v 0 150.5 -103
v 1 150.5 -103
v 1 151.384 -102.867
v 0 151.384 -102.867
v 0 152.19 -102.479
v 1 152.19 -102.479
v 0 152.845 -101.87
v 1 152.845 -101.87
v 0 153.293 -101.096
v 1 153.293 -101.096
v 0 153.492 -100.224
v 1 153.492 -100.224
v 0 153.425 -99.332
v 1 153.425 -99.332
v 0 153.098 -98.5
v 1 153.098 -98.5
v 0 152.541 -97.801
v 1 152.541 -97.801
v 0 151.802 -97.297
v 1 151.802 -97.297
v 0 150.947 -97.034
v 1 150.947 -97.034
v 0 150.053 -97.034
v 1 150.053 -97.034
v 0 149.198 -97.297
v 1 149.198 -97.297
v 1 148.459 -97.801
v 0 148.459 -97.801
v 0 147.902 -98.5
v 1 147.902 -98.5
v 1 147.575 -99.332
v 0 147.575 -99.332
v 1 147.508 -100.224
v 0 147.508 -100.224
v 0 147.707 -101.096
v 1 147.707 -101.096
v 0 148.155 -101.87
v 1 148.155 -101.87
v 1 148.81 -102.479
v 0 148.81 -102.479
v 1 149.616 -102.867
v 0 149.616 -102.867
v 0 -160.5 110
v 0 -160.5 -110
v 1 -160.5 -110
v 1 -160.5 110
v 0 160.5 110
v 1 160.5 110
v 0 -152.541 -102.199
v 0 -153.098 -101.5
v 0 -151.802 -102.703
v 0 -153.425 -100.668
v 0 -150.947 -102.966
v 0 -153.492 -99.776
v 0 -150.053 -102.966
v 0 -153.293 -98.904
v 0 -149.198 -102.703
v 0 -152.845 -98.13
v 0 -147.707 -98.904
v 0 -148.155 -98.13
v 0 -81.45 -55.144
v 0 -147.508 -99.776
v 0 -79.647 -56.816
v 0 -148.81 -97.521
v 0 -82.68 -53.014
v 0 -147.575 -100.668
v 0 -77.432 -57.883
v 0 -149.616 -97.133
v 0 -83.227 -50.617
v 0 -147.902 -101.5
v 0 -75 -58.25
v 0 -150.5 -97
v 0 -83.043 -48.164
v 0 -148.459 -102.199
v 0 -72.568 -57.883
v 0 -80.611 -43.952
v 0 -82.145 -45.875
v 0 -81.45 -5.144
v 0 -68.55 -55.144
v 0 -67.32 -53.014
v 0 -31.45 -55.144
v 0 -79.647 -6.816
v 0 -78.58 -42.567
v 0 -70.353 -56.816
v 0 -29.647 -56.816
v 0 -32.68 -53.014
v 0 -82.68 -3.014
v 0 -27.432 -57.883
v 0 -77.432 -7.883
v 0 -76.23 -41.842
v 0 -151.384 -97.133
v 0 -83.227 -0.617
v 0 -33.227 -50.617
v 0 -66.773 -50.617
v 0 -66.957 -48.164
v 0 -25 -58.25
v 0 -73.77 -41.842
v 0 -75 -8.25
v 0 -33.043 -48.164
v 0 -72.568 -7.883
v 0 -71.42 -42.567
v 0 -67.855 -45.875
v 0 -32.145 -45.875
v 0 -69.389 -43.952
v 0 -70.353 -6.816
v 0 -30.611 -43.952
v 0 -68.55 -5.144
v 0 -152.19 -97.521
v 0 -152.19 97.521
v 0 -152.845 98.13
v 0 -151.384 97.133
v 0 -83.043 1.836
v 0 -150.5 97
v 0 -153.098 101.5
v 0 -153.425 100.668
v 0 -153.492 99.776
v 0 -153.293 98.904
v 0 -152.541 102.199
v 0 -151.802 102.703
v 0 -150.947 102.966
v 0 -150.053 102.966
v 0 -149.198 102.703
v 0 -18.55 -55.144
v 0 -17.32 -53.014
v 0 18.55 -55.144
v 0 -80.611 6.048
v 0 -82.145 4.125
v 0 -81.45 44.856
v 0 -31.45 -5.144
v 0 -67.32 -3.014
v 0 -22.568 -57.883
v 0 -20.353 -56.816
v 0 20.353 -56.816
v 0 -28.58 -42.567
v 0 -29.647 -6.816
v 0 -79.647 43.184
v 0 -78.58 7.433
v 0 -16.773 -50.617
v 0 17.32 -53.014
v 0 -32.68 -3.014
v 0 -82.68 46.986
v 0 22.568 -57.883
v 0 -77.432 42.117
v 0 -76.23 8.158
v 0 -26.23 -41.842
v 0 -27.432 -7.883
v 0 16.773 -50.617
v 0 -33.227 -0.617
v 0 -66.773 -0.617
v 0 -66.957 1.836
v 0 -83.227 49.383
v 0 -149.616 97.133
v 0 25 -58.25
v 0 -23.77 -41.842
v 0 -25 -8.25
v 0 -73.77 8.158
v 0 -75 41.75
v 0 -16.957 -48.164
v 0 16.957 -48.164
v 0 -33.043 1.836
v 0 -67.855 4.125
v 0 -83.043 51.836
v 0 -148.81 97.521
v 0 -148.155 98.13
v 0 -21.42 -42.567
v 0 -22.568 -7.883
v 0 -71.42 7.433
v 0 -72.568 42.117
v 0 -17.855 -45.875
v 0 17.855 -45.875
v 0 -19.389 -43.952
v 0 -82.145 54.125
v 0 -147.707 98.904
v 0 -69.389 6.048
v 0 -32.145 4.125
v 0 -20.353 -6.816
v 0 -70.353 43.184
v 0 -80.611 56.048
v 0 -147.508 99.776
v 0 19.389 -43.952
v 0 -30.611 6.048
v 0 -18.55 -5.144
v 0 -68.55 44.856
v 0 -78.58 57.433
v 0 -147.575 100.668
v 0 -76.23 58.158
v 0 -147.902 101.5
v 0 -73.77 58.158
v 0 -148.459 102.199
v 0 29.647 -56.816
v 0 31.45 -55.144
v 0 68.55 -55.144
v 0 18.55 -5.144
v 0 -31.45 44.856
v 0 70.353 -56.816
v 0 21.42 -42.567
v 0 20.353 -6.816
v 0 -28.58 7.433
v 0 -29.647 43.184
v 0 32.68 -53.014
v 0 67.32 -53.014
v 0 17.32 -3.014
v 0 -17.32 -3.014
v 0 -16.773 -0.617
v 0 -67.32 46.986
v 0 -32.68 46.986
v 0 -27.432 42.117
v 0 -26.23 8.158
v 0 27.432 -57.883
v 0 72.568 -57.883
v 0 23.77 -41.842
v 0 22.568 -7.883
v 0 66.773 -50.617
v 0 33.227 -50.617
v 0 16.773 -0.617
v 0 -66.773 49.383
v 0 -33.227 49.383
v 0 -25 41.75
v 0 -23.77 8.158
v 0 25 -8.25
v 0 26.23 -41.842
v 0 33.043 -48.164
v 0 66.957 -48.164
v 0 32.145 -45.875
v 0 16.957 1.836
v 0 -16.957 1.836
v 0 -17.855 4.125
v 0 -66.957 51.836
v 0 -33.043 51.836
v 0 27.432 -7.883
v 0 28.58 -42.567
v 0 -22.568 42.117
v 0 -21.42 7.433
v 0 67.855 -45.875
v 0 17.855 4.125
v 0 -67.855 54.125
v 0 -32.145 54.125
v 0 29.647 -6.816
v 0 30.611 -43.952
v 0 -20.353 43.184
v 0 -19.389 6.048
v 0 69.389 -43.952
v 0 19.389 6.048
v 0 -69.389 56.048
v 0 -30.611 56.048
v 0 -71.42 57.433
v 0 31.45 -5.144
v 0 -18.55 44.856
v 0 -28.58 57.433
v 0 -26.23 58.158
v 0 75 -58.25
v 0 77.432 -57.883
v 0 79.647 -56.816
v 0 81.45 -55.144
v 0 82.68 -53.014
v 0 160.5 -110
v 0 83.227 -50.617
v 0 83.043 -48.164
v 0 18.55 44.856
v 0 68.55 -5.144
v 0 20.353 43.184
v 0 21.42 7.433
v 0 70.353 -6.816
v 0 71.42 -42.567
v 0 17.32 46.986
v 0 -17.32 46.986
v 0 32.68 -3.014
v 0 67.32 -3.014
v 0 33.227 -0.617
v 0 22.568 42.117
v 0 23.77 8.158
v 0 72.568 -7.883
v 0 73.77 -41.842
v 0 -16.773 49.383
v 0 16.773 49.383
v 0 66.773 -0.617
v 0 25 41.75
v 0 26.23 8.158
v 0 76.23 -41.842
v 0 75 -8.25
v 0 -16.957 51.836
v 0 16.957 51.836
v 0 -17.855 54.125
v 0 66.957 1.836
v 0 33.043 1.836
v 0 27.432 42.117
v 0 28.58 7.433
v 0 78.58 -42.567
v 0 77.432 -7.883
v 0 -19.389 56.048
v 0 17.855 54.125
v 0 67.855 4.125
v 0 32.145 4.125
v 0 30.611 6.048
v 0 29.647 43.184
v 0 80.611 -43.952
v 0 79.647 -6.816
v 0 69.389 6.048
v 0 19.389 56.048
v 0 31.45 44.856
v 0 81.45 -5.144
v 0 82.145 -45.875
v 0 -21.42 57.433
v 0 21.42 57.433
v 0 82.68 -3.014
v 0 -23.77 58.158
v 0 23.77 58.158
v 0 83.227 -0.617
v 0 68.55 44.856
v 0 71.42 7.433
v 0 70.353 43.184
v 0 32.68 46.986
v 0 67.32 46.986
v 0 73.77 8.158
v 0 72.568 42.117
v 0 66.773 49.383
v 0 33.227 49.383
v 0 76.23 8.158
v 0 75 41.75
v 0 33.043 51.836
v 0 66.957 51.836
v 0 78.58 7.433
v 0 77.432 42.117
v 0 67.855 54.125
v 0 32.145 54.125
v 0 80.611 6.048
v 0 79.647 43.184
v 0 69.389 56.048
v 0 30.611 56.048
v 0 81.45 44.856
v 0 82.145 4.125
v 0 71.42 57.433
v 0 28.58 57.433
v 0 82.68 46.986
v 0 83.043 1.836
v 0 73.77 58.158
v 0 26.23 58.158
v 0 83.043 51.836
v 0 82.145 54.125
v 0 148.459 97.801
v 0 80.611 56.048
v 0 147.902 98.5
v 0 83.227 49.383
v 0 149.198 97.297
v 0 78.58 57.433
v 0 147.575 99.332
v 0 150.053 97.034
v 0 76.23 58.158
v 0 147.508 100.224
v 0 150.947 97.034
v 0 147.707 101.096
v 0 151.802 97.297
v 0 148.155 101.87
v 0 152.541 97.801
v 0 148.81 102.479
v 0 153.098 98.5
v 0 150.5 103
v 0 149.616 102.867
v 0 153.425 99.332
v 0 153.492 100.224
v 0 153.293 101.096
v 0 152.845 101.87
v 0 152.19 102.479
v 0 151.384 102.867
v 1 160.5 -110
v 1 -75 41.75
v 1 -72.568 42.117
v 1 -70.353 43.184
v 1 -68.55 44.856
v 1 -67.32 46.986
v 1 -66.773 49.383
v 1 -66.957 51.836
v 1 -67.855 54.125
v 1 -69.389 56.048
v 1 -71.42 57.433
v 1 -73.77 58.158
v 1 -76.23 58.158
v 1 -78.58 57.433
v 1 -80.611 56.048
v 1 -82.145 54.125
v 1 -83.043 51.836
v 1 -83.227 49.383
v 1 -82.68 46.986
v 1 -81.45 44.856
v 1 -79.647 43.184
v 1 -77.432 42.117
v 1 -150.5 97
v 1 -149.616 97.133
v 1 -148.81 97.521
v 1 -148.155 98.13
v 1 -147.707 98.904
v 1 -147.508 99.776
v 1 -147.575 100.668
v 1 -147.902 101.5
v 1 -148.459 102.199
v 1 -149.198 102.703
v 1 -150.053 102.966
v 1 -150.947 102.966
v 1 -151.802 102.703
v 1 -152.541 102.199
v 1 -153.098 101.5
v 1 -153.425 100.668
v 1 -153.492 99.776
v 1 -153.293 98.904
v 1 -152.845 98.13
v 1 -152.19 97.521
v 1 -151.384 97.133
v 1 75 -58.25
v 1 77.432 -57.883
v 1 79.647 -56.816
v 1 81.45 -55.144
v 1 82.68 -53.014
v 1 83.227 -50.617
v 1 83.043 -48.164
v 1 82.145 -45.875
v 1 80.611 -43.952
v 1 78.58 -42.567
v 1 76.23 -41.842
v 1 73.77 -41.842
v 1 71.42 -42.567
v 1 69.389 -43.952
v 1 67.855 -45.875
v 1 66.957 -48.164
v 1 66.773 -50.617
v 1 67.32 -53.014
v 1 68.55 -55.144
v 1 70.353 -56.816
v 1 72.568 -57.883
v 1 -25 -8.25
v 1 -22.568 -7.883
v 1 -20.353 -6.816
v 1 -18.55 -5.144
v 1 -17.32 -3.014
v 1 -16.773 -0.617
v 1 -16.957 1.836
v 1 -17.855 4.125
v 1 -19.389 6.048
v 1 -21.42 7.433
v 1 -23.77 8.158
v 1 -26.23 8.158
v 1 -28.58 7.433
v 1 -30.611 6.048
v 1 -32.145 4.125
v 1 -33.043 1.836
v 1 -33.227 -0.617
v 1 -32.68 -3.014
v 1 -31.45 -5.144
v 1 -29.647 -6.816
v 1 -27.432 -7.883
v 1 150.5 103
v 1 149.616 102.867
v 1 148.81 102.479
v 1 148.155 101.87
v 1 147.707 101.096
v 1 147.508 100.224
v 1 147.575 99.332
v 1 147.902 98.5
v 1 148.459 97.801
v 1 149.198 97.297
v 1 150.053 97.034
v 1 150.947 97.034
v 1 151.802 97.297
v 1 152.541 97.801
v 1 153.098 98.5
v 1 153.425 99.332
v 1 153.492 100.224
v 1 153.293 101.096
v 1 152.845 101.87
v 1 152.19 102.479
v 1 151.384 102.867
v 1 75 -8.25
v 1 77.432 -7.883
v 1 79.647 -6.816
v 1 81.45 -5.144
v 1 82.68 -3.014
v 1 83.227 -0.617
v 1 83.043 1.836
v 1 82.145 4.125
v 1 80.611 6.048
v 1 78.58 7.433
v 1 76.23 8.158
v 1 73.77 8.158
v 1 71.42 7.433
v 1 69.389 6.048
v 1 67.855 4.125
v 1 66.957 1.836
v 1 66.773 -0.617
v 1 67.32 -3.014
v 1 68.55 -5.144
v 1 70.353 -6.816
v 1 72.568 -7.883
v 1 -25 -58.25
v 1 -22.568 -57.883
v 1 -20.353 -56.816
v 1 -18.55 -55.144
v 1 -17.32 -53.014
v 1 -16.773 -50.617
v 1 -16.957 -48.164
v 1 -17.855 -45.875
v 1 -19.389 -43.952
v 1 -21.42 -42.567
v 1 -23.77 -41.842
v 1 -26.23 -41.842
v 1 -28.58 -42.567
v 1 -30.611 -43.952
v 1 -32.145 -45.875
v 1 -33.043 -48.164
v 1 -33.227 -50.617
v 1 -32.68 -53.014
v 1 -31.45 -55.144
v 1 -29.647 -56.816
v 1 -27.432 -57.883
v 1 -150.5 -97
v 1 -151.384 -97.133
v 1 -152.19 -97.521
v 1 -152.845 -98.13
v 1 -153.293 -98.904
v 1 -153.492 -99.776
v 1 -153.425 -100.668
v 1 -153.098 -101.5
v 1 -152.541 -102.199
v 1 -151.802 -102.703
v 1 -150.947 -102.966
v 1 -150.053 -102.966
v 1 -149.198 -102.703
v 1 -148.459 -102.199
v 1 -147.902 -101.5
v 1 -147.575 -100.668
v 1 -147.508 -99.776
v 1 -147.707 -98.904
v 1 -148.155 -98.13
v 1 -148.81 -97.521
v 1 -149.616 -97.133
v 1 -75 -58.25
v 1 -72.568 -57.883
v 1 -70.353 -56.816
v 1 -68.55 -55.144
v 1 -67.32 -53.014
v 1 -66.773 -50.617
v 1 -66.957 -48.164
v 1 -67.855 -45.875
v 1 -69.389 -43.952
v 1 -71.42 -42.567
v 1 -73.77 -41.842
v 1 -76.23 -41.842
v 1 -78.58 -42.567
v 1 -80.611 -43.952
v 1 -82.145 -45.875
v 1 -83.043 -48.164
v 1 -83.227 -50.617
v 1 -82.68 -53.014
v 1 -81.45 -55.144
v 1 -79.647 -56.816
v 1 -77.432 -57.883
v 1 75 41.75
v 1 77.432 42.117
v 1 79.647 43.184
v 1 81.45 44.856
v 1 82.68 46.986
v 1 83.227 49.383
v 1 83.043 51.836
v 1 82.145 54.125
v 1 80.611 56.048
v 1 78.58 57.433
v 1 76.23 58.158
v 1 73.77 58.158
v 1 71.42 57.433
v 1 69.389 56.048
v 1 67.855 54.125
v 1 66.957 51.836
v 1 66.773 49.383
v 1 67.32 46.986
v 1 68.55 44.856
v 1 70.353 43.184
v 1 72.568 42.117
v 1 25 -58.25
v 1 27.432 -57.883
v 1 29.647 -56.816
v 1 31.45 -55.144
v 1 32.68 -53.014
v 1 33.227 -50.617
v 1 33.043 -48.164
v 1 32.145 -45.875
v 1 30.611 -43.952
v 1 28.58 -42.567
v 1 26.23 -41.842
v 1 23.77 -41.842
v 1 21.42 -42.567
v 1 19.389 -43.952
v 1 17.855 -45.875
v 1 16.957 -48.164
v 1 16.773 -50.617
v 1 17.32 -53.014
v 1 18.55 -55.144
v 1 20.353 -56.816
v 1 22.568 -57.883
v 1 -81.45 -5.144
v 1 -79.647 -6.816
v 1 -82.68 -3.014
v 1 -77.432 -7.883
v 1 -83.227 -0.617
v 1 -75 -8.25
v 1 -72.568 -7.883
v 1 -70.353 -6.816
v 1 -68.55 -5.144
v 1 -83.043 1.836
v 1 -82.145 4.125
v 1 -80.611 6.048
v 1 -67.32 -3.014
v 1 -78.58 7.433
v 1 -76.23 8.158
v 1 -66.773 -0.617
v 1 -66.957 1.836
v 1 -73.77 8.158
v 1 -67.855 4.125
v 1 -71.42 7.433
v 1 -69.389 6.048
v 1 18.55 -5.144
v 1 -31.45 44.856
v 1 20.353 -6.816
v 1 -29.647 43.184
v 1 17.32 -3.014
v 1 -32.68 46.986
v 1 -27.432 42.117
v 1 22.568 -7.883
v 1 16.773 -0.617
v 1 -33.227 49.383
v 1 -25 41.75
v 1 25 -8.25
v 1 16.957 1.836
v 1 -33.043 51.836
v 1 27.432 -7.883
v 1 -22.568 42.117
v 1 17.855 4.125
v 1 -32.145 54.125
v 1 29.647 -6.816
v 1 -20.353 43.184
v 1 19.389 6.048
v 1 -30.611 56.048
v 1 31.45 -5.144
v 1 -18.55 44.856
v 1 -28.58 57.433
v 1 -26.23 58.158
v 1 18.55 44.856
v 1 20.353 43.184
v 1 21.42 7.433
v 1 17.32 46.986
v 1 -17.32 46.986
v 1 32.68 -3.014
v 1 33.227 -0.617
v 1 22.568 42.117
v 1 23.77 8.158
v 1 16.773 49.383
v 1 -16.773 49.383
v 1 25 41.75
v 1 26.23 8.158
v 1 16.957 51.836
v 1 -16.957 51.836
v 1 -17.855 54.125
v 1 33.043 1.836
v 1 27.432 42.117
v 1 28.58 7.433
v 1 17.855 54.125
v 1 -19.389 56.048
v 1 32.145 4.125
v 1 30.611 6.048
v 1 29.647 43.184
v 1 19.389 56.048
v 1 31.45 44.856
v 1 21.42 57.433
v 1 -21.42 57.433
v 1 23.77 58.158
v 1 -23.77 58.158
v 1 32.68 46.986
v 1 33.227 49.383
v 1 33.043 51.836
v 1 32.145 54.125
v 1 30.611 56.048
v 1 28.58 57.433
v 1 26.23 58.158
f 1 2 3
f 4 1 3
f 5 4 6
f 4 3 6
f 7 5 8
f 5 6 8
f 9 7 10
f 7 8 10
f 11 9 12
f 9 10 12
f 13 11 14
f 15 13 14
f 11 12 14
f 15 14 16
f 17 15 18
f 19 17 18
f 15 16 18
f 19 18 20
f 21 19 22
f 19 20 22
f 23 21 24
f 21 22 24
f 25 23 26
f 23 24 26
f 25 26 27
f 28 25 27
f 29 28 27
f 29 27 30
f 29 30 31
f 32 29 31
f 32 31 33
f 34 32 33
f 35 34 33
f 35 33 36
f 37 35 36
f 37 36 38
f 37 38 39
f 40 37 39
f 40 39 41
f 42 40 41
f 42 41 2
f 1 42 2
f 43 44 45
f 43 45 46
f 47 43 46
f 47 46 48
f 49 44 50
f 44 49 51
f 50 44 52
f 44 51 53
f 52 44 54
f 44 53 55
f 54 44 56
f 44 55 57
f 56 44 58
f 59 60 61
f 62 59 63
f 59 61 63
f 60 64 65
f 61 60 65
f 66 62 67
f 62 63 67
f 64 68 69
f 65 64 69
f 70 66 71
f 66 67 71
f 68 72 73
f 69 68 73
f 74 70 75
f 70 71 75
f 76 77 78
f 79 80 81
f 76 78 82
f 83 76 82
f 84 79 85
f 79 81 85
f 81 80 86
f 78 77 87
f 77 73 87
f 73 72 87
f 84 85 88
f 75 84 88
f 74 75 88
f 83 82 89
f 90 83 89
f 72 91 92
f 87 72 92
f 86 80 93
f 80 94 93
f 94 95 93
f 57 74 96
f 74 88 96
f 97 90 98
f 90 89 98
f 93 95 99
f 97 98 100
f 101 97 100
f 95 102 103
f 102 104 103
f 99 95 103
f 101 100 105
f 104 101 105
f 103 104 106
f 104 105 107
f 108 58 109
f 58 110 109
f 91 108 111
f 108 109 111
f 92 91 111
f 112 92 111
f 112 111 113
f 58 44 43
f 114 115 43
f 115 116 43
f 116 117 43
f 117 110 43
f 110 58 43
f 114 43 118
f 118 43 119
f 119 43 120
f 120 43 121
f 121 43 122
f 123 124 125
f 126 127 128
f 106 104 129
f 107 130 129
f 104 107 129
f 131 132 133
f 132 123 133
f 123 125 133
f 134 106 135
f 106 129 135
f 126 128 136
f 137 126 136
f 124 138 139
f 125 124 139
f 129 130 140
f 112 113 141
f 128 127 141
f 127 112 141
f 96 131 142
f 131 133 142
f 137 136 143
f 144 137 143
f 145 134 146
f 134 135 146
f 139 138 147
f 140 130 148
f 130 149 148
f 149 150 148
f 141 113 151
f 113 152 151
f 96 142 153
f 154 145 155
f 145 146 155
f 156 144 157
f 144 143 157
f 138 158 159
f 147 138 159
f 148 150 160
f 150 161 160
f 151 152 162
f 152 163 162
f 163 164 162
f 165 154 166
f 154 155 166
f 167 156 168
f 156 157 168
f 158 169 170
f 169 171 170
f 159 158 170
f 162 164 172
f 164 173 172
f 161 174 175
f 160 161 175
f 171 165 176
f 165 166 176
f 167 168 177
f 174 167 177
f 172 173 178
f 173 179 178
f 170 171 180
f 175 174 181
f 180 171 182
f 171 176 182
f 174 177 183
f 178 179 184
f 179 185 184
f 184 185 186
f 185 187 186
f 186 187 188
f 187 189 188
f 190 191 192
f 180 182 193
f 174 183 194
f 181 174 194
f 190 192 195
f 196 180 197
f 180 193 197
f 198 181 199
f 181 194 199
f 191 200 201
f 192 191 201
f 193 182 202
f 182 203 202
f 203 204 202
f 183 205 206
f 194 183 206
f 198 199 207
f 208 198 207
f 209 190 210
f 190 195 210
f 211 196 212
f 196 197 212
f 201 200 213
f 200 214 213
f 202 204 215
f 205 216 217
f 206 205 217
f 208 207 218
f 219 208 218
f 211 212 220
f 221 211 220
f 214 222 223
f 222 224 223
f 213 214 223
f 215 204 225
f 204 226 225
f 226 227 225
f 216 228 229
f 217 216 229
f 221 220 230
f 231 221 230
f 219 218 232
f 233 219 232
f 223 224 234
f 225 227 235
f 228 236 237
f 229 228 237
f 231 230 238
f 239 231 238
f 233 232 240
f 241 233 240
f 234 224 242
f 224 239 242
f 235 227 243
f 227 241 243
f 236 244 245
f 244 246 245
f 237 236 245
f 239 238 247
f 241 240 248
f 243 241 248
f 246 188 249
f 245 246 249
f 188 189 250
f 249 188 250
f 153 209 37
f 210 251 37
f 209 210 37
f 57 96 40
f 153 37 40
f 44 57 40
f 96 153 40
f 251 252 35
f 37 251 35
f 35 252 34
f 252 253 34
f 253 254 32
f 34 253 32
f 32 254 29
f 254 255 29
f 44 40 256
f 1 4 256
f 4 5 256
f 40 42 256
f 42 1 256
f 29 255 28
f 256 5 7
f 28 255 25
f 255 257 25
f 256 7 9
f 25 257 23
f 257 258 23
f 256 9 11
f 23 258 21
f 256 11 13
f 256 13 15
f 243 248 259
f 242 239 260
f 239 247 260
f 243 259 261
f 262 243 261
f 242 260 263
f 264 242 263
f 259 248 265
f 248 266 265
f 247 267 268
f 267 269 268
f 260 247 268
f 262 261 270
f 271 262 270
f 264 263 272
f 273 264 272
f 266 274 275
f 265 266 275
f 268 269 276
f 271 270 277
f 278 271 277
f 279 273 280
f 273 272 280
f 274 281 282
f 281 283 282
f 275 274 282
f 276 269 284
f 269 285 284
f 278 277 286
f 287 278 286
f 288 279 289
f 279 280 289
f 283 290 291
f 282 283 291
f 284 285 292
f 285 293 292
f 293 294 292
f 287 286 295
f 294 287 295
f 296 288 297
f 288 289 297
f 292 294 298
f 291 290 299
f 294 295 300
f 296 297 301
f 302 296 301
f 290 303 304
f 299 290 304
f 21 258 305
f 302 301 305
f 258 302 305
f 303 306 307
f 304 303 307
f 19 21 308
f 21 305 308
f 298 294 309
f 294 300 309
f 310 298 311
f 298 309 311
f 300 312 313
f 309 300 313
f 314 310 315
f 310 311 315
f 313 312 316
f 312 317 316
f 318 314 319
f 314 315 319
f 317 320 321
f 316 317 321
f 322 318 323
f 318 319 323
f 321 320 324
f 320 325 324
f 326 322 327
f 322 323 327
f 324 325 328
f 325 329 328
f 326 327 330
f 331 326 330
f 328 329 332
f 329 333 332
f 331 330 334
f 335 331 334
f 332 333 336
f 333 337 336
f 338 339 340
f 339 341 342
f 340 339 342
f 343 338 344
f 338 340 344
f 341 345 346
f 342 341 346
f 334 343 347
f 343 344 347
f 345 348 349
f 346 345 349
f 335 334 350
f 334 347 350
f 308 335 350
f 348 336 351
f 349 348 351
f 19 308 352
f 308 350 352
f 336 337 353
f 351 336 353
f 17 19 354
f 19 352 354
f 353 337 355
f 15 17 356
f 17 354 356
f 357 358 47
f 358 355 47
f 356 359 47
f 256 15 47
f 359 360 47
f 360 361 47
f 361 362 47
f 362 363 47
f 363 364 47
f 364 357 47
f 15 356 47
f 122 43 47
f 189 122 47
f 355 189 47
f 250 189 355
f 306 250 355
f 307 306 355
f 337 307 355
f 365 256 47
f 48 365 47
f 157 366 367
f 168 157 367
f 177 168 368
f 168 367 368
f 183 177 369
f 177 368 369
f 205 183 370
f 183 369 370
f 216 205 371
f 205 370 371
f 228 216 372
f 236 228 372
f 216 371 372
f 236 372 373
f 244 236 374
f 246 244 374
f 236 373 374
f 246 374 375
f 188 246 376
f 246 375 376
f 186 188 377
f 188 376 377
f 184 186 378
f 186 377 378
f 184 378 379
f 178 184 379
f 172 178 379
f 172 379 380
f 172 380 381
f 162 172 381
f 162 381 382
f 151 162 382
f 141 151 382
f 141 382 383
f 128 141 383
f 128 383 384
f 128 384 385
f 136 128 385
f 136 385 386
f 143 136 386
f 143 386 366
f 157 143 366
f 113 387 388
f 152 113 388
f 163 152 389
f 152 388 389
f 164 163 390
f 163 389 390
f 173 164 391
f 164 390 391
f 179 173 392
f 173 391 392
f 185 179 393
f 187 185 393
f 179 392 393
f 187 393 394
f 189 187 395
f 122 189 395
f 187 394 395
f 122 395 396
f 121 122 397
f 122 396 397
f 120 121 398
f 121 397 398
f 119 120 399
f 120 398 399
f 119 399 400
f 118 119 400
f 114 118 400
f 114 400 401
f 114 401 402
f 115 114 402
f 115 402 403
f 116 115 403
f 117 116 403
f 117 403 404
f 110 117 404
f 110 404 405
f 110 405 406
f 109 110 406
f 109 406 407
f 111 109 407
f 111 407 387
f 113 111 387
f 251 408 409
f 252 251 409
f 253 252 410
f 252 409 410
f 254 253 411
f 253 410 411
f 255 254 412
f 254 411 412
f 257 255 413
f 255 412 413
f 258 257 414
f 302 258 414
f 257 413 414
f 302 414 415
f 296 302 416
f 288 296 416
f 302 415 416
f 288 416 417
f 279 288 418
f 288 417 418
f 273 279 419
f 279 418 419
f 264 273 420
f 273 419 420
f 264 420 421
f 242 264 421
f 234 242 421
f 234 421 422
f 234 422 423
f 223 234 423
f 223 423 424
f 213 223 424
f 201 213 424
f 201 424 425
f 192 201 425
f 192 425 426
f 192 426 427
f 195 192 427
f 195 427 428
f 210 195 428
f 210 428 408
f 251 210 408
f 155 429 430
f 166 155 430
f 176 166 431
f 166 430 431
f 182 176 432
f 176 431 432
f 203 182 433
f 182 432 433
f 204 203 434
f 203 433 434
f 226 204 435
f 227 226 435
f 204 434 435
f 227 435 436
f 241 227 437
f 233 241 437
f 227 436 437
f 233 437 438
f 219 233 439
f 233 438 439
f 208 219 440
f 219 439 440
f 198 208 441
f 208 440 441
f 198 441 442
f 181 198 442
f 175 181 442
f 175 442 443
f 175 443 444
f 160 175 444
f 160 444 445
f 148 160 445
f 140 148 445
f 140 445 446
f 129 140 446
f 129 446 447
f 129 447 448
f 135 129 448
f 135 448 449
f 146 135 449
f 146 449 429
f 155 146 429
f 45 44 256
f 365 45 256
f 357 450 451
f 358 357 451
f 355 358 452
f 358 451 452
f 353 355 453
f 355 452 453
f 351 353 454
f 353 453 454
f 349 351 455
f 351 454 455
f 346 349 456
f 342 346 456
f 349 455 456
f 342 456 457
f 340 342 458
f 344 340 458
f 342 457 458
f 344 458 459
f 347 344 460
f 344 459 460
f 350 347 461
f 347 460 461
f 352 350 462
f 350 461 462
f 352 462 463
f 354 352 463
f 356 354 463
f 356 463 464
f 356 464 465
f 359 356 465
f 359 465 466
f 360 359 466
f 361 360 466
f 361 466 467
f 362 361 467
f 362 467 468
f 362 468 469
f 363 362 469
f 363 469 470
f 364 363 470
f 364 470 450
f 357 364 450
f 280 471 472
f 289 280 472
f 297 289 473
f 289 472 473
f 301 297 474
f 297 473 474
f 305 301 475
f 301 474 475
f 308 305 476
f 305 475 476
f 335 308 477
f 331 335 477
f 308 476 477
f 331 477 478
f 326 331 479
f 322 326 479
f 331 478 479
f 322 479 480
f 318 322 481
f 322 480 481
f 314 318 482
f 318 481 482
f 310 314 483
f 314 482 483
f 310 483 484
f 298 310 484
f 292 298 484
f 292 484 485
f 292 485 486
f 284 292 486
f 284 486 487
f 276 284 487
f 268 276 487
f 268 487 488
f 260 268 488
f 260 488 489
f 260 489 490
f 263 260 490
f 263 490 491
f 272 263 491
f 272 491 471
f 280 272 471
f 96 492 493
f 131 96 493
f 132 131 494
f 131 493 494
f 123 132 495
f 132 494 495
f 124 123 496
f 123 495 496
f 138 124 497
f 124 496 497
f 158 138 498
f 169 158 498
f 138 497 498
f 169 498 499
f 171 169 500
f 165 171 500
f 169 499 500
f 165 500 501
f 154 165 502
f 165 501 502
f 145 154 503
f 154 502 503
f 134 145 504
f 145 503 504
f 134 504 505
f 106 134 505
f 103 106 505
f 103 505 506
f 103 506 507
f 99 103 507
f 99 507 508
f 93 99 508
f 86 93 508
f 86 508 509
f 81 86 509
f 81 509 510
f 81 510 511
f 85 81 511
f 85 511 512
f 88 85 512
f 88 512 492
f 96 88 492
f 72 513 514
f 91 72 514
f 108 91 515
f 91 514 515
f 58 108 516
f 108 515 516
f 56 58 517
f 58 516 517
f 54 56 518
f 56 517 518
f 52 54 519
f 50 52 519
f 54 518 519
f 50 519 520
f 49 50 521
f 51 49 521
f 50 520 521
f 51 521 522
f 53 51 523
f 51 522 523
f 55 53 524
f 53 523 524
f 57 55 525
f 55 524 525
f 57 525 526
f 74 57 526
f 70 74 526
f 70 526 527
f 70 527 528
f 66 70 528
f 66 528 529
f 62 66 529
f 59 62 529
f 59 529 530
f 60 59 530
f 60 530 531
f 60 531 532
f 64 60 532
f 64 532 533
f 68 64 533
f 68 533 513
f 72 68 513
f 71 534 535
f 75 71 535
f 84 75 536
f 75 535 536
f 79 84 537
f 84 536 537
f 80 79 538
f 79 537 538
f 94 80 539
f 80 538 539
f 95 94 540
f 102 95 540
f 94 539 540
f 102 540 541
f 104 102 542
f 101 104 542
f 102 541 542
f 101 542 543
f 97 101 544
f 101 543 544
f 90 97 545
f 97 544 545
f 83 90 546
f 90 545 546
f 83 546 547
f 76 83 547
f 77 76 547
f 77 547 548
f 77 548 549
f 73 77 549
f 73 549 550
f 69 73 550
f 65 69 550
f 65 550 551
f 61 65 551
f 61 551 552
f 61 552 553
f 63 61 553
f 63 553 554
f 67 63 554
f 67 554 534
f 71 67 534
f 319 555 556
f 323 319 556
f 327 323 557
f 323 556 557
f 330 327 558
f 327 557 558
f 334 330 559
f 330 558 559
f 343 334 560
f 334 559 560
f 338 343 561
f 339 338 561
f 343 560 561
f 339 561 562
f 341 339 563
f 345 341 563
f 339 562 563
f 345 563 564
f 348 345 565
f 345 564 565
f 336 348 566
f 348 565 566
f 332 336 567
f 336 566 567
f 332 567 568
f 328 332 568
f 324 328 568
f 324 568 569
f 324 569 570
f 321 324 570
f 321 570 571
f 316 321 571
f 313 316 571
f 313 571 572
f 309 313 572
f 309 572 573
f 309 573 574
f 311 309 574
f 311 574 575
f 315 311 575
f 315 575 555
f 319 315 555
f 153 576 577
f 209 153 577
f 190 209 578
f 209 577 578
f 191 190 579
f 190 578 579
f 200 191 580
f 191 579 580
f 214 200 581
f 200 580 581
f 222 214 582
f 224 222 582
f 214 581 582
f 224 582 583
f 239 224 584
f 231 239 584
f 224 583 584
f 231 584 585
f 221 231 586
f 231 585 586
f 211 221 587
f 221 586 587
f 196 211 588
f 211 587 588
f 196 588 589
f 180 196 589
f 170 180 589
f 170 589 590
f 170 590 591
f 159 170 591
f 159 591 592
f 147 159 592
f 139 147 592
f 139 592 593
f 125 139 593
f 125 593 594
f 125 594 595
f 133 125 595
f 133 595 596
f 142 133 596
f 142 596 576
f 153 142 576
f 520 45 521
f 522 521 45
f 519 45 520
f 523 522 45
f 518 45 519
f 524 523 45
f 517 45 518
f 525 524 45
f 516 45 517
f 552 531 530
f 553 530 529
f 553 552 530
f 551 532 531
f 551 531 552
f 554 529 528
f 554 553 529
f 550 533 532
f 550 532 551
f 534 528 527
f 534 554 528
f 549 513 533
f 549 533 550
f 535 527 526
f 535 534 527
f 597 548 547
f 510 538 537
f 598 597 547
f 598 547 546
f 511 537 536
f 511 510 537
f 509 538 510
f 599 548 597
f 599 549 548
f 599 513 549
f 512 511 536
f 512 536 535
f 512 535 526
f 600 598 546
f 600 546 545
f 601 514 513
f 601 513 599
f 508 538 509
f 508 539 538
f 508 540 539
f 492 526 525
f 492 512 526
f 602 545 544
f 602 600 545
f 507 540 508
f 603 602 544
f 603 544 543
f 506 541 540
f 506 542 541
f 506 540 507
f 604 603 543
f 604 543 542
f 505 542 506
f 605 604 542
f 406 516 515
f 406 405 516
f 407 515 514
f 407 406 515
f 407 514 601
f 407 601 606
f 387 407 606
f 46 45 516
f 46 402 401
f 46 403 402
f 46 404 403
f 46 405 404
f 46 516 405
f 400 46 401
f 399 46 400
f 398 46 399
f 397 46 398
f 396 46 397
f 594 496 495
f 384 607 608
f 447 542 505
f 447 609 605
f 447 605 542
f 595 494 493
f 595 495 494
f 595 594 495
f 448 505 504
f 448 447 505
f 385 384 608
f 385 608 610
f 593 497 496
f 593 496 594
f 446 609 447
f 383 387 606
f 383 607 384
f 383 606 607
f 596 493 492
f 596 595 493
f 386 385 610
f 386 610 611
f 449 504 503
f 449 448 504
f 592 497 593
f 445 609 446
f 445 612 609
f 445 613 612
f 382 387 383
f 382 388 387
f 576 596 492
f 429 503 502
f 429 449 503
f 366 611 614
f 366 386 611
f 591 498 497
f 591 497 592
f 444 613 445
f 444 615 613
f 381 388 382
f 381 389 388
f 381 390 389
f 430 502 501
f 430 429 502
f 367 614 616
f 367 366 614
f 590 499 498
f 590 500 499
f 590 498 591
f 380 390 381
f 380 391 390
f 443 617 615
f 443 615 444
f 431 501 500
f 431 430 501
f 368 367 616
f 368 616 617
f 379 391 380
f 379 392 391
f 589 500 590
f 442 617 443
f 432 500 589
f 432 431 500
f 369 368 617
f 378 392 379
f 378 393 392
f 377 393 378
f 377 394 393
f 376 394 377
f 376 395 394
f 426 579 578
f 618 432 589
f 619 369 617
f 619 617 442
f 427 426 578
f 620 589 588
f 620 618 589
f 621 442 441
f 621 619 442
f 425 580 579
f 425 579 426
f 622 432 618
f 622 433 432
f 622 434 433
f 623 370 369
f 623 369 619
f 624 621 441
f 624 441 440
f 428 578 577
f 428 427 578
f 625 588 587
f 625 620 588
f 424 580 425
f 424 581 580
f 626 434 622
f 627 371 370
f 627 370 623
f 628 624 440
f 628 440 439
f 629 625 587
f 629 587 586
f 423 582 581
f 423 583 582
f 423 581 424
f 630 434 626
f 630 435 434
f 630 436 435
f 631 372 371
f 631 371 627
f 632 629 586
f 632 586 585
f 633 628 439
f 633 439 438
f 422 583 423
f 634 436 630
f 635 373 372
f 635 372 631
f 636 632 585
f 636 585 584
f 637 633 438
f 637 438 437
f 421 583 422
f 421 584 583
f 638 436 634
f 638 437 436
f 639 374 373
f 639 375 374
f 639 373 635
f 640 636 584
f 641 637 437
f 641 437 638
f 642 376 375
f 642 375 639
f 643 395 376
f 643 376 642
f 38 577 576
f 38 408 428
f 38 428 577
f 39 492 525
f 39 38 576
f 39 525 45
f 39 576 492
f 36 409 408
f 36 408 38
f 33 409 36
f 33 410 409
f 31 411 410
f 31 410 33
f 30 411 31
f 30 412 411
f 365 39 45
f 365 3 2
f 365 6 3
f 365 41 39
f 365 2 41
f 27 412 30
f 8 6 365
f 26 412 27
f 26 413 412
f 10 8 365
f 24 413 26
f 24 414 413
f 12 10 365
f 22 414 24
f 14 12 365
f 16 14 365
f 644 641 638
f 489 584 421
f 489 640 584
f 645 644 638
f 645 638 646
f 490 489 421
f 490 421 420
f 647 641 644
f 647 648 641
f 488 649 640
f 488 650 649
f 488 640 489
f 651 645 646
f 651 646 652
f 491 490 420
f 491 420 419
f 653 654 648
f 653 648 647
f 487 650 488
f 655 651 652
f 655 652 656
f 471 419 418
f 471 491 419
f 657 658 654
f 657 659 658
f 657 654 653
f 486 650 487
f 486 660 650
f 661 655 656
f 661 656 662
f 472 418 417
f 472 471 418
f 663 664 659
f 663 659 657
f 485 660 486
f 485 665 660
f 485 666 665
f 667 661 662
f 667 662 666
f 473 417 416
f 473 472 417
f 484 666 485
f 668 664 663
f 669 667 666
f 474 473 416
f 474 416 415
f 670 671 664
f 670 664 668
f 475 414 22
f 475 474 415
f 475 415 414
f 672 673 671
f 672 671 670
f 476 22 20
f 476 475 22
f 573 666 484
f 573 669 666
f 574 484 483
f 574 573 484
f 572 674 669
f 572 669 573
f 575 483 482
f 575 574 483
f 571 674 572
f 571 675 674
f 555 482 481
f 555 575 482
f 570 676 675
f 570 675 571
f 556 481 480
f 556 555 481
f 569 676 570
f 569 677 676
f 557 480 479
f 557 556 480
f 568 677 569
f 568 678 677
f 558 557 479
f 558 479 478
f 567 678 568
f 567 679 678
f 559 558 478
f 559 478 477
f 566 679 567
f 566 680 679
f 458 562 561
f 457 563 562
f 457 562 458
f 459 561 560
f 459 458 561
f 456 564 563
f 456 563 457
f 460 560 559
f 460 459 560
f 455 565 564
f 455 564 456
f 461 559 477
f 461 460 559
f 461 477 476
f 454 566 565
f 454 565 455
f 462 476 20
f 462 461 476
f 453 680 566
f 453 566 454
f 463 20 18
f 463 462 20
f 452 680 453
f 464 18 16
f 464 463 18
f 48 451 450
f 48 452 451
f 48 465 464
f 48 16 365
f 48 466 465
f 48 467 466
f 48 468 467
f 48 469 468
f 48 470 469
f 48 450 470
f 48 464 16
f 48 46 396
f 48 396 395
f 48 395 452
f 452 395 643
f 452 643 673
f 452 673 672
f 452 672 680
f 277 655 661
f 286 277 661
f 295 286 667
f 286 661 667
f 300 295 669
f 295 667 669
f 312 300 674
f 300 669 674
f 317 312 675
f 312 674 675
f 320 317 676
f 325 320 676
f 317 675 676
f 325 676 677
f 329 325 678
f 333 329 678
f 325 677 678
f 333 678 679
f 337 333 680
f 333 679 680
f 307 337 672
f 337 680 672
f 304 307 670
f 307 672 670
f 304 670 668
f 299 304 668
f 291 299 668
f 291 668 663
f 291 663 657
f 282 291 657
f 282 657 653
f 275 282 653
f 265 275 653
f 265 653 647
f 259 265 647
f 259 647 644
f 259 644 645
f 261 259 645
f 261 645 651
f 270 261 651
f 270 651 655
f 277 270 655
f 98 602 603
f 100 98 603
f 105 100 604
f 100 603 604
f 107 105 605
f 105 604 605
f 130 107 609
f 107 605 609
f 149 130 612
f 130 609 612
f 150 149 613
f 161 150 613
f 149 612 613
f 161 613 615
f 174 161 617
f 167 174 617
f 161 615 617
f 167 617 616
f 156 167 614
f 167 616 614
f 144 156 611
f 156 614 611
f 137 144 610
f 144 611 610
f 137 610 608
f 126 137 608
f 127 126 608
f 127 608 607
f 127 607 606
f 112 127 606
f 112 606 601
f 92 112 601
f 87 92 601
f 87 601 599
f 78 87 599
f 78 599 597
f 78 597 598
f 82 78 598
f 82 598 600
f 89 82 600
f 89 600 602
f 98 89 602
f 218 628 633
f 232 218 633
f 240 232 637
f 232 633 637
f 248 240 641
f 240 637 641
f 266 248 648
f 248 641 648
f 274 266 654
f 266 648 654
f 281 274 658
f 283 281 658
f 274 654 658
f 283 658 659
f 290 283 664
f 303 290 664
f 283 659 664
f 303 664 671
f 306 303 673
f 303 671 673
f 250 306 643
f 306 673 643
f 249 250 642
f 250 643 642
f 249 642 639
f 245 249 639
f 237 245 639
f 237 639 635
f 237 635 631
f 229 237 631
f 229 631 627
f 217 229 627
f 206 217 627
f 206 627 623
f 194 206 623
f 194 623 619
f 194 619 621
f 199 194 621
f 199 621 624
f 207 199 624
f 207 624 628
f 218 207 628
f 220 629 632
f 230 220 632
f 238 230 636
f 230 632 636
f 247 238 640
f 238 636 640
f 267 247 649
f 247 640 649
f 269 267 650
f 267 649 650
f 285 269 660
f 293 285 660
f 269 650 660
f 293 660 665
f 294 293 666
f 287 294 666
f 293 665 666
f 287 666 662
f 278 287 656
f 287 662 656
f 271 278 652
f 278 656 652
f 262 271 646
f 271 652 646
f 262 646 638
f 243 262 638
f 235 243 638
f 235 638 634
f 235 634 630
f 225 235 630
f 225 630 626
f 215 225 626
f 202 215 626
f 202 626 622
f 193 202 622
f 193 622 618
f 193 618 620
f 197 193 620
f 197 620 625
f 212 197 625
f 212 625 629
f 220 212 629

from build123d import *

# Parameters (mm, degrees)
SKETCH1_W           = 321
SKETCH1_H           = 220
BOSS_EXTRUDE1_DEPTH = 1
SKETCH2_R           = 8.25
CUT_EXTRUDE1_DEPTH  = 195.579675198
SKETCH3_R           = 3
CUT_EXTRUDE2_DEPTH  = 195.579675198


with BuildPart() as part:
    # Sketch1 → Boss-Extrude1 (new body)
    with BuildSketch(Plane.YZ):
        Rectangle(SKETCH1_W, SKETCH1_H)
    extrude(amount=BOSS_EXTRUDE1_DEPTH)

    # Sketch2 → Cut-Extrude1 (cut, through all)
    with BuildSketch(Plane.YZ.offset(1)):
        with Locations(Location((-75, 50, 0), (0, 0, 270))):
            Circle(SKETCH2_R)
        with Locations(Location((-25, 50, 0), (0, 0, 270))):
            Circle(SKETCH2_R)
        with Locations(Location((25, 50, 0), (0, 0, 270))):
            Circle(SKETCH2_R)
        with Locations(Location((75, 50, 0), (0, 0, 270))):
            Circle(SKETCH2_R)
        with Locations(Location((-25, 0, 0), (0, 0, 270))):
            Circle(SKETCH2_R)
        with Locations(Location((25, 0, 0), (0, 0, 270))):
            Circle(SKETCH2_R)
        with Locations(Location((75, 0, 0), (0, 0, 270))):
            Circle(SKETCH2_R)
        with Locations(Location((-25, -50, 0), (0, 0, 270))):
            Circle(SKETCH2_R)
        with Locations(Location((25, -50, 0), (0, 0, 270))):
            Circle(SKETCH2_R)
        with Locations(Location((75, -50, 0), (0, 0, 270))):
            Circle(SKETCH2_R)
        with Locations(Location((-75, 0, 0), (0, 0, 270))):
            Circle(SKETCH2_R)
        with Locations(Location((-75, -50, 0), (0, 0, 270))):
            Circle(SKETCH2_R)
    extrude(amount=-CUT_EXTRUDE1_DEPTH, mode=Mode.SUBTRACT)

    # Sketch3 → Cut-Extrude2 (cut, through all)
    with BuildSketch(Plane.YZ.offset(1)):
        with Locations(Location((-150.5, 100, 0), (0, 0, 270))):
            Circle(SKETCH3_R)
        with Locations(Location((150.5, 100, 0), (0, 0, 90))):
            Circle(SKETCH3_R)
        with Locations(Location((-150.5, -100, 0), (0, 0, 90))):
            Circle(SKETCH3_R)
        with Locations(Location((150.5, -100, 0), (0, 0, 270))):
            Circle(SKETCH3_R)
    extrude(amount=-CUT_EXTRUDE2_DEPTH, mode=Mode.SUBTRACT)


solid = part.part
